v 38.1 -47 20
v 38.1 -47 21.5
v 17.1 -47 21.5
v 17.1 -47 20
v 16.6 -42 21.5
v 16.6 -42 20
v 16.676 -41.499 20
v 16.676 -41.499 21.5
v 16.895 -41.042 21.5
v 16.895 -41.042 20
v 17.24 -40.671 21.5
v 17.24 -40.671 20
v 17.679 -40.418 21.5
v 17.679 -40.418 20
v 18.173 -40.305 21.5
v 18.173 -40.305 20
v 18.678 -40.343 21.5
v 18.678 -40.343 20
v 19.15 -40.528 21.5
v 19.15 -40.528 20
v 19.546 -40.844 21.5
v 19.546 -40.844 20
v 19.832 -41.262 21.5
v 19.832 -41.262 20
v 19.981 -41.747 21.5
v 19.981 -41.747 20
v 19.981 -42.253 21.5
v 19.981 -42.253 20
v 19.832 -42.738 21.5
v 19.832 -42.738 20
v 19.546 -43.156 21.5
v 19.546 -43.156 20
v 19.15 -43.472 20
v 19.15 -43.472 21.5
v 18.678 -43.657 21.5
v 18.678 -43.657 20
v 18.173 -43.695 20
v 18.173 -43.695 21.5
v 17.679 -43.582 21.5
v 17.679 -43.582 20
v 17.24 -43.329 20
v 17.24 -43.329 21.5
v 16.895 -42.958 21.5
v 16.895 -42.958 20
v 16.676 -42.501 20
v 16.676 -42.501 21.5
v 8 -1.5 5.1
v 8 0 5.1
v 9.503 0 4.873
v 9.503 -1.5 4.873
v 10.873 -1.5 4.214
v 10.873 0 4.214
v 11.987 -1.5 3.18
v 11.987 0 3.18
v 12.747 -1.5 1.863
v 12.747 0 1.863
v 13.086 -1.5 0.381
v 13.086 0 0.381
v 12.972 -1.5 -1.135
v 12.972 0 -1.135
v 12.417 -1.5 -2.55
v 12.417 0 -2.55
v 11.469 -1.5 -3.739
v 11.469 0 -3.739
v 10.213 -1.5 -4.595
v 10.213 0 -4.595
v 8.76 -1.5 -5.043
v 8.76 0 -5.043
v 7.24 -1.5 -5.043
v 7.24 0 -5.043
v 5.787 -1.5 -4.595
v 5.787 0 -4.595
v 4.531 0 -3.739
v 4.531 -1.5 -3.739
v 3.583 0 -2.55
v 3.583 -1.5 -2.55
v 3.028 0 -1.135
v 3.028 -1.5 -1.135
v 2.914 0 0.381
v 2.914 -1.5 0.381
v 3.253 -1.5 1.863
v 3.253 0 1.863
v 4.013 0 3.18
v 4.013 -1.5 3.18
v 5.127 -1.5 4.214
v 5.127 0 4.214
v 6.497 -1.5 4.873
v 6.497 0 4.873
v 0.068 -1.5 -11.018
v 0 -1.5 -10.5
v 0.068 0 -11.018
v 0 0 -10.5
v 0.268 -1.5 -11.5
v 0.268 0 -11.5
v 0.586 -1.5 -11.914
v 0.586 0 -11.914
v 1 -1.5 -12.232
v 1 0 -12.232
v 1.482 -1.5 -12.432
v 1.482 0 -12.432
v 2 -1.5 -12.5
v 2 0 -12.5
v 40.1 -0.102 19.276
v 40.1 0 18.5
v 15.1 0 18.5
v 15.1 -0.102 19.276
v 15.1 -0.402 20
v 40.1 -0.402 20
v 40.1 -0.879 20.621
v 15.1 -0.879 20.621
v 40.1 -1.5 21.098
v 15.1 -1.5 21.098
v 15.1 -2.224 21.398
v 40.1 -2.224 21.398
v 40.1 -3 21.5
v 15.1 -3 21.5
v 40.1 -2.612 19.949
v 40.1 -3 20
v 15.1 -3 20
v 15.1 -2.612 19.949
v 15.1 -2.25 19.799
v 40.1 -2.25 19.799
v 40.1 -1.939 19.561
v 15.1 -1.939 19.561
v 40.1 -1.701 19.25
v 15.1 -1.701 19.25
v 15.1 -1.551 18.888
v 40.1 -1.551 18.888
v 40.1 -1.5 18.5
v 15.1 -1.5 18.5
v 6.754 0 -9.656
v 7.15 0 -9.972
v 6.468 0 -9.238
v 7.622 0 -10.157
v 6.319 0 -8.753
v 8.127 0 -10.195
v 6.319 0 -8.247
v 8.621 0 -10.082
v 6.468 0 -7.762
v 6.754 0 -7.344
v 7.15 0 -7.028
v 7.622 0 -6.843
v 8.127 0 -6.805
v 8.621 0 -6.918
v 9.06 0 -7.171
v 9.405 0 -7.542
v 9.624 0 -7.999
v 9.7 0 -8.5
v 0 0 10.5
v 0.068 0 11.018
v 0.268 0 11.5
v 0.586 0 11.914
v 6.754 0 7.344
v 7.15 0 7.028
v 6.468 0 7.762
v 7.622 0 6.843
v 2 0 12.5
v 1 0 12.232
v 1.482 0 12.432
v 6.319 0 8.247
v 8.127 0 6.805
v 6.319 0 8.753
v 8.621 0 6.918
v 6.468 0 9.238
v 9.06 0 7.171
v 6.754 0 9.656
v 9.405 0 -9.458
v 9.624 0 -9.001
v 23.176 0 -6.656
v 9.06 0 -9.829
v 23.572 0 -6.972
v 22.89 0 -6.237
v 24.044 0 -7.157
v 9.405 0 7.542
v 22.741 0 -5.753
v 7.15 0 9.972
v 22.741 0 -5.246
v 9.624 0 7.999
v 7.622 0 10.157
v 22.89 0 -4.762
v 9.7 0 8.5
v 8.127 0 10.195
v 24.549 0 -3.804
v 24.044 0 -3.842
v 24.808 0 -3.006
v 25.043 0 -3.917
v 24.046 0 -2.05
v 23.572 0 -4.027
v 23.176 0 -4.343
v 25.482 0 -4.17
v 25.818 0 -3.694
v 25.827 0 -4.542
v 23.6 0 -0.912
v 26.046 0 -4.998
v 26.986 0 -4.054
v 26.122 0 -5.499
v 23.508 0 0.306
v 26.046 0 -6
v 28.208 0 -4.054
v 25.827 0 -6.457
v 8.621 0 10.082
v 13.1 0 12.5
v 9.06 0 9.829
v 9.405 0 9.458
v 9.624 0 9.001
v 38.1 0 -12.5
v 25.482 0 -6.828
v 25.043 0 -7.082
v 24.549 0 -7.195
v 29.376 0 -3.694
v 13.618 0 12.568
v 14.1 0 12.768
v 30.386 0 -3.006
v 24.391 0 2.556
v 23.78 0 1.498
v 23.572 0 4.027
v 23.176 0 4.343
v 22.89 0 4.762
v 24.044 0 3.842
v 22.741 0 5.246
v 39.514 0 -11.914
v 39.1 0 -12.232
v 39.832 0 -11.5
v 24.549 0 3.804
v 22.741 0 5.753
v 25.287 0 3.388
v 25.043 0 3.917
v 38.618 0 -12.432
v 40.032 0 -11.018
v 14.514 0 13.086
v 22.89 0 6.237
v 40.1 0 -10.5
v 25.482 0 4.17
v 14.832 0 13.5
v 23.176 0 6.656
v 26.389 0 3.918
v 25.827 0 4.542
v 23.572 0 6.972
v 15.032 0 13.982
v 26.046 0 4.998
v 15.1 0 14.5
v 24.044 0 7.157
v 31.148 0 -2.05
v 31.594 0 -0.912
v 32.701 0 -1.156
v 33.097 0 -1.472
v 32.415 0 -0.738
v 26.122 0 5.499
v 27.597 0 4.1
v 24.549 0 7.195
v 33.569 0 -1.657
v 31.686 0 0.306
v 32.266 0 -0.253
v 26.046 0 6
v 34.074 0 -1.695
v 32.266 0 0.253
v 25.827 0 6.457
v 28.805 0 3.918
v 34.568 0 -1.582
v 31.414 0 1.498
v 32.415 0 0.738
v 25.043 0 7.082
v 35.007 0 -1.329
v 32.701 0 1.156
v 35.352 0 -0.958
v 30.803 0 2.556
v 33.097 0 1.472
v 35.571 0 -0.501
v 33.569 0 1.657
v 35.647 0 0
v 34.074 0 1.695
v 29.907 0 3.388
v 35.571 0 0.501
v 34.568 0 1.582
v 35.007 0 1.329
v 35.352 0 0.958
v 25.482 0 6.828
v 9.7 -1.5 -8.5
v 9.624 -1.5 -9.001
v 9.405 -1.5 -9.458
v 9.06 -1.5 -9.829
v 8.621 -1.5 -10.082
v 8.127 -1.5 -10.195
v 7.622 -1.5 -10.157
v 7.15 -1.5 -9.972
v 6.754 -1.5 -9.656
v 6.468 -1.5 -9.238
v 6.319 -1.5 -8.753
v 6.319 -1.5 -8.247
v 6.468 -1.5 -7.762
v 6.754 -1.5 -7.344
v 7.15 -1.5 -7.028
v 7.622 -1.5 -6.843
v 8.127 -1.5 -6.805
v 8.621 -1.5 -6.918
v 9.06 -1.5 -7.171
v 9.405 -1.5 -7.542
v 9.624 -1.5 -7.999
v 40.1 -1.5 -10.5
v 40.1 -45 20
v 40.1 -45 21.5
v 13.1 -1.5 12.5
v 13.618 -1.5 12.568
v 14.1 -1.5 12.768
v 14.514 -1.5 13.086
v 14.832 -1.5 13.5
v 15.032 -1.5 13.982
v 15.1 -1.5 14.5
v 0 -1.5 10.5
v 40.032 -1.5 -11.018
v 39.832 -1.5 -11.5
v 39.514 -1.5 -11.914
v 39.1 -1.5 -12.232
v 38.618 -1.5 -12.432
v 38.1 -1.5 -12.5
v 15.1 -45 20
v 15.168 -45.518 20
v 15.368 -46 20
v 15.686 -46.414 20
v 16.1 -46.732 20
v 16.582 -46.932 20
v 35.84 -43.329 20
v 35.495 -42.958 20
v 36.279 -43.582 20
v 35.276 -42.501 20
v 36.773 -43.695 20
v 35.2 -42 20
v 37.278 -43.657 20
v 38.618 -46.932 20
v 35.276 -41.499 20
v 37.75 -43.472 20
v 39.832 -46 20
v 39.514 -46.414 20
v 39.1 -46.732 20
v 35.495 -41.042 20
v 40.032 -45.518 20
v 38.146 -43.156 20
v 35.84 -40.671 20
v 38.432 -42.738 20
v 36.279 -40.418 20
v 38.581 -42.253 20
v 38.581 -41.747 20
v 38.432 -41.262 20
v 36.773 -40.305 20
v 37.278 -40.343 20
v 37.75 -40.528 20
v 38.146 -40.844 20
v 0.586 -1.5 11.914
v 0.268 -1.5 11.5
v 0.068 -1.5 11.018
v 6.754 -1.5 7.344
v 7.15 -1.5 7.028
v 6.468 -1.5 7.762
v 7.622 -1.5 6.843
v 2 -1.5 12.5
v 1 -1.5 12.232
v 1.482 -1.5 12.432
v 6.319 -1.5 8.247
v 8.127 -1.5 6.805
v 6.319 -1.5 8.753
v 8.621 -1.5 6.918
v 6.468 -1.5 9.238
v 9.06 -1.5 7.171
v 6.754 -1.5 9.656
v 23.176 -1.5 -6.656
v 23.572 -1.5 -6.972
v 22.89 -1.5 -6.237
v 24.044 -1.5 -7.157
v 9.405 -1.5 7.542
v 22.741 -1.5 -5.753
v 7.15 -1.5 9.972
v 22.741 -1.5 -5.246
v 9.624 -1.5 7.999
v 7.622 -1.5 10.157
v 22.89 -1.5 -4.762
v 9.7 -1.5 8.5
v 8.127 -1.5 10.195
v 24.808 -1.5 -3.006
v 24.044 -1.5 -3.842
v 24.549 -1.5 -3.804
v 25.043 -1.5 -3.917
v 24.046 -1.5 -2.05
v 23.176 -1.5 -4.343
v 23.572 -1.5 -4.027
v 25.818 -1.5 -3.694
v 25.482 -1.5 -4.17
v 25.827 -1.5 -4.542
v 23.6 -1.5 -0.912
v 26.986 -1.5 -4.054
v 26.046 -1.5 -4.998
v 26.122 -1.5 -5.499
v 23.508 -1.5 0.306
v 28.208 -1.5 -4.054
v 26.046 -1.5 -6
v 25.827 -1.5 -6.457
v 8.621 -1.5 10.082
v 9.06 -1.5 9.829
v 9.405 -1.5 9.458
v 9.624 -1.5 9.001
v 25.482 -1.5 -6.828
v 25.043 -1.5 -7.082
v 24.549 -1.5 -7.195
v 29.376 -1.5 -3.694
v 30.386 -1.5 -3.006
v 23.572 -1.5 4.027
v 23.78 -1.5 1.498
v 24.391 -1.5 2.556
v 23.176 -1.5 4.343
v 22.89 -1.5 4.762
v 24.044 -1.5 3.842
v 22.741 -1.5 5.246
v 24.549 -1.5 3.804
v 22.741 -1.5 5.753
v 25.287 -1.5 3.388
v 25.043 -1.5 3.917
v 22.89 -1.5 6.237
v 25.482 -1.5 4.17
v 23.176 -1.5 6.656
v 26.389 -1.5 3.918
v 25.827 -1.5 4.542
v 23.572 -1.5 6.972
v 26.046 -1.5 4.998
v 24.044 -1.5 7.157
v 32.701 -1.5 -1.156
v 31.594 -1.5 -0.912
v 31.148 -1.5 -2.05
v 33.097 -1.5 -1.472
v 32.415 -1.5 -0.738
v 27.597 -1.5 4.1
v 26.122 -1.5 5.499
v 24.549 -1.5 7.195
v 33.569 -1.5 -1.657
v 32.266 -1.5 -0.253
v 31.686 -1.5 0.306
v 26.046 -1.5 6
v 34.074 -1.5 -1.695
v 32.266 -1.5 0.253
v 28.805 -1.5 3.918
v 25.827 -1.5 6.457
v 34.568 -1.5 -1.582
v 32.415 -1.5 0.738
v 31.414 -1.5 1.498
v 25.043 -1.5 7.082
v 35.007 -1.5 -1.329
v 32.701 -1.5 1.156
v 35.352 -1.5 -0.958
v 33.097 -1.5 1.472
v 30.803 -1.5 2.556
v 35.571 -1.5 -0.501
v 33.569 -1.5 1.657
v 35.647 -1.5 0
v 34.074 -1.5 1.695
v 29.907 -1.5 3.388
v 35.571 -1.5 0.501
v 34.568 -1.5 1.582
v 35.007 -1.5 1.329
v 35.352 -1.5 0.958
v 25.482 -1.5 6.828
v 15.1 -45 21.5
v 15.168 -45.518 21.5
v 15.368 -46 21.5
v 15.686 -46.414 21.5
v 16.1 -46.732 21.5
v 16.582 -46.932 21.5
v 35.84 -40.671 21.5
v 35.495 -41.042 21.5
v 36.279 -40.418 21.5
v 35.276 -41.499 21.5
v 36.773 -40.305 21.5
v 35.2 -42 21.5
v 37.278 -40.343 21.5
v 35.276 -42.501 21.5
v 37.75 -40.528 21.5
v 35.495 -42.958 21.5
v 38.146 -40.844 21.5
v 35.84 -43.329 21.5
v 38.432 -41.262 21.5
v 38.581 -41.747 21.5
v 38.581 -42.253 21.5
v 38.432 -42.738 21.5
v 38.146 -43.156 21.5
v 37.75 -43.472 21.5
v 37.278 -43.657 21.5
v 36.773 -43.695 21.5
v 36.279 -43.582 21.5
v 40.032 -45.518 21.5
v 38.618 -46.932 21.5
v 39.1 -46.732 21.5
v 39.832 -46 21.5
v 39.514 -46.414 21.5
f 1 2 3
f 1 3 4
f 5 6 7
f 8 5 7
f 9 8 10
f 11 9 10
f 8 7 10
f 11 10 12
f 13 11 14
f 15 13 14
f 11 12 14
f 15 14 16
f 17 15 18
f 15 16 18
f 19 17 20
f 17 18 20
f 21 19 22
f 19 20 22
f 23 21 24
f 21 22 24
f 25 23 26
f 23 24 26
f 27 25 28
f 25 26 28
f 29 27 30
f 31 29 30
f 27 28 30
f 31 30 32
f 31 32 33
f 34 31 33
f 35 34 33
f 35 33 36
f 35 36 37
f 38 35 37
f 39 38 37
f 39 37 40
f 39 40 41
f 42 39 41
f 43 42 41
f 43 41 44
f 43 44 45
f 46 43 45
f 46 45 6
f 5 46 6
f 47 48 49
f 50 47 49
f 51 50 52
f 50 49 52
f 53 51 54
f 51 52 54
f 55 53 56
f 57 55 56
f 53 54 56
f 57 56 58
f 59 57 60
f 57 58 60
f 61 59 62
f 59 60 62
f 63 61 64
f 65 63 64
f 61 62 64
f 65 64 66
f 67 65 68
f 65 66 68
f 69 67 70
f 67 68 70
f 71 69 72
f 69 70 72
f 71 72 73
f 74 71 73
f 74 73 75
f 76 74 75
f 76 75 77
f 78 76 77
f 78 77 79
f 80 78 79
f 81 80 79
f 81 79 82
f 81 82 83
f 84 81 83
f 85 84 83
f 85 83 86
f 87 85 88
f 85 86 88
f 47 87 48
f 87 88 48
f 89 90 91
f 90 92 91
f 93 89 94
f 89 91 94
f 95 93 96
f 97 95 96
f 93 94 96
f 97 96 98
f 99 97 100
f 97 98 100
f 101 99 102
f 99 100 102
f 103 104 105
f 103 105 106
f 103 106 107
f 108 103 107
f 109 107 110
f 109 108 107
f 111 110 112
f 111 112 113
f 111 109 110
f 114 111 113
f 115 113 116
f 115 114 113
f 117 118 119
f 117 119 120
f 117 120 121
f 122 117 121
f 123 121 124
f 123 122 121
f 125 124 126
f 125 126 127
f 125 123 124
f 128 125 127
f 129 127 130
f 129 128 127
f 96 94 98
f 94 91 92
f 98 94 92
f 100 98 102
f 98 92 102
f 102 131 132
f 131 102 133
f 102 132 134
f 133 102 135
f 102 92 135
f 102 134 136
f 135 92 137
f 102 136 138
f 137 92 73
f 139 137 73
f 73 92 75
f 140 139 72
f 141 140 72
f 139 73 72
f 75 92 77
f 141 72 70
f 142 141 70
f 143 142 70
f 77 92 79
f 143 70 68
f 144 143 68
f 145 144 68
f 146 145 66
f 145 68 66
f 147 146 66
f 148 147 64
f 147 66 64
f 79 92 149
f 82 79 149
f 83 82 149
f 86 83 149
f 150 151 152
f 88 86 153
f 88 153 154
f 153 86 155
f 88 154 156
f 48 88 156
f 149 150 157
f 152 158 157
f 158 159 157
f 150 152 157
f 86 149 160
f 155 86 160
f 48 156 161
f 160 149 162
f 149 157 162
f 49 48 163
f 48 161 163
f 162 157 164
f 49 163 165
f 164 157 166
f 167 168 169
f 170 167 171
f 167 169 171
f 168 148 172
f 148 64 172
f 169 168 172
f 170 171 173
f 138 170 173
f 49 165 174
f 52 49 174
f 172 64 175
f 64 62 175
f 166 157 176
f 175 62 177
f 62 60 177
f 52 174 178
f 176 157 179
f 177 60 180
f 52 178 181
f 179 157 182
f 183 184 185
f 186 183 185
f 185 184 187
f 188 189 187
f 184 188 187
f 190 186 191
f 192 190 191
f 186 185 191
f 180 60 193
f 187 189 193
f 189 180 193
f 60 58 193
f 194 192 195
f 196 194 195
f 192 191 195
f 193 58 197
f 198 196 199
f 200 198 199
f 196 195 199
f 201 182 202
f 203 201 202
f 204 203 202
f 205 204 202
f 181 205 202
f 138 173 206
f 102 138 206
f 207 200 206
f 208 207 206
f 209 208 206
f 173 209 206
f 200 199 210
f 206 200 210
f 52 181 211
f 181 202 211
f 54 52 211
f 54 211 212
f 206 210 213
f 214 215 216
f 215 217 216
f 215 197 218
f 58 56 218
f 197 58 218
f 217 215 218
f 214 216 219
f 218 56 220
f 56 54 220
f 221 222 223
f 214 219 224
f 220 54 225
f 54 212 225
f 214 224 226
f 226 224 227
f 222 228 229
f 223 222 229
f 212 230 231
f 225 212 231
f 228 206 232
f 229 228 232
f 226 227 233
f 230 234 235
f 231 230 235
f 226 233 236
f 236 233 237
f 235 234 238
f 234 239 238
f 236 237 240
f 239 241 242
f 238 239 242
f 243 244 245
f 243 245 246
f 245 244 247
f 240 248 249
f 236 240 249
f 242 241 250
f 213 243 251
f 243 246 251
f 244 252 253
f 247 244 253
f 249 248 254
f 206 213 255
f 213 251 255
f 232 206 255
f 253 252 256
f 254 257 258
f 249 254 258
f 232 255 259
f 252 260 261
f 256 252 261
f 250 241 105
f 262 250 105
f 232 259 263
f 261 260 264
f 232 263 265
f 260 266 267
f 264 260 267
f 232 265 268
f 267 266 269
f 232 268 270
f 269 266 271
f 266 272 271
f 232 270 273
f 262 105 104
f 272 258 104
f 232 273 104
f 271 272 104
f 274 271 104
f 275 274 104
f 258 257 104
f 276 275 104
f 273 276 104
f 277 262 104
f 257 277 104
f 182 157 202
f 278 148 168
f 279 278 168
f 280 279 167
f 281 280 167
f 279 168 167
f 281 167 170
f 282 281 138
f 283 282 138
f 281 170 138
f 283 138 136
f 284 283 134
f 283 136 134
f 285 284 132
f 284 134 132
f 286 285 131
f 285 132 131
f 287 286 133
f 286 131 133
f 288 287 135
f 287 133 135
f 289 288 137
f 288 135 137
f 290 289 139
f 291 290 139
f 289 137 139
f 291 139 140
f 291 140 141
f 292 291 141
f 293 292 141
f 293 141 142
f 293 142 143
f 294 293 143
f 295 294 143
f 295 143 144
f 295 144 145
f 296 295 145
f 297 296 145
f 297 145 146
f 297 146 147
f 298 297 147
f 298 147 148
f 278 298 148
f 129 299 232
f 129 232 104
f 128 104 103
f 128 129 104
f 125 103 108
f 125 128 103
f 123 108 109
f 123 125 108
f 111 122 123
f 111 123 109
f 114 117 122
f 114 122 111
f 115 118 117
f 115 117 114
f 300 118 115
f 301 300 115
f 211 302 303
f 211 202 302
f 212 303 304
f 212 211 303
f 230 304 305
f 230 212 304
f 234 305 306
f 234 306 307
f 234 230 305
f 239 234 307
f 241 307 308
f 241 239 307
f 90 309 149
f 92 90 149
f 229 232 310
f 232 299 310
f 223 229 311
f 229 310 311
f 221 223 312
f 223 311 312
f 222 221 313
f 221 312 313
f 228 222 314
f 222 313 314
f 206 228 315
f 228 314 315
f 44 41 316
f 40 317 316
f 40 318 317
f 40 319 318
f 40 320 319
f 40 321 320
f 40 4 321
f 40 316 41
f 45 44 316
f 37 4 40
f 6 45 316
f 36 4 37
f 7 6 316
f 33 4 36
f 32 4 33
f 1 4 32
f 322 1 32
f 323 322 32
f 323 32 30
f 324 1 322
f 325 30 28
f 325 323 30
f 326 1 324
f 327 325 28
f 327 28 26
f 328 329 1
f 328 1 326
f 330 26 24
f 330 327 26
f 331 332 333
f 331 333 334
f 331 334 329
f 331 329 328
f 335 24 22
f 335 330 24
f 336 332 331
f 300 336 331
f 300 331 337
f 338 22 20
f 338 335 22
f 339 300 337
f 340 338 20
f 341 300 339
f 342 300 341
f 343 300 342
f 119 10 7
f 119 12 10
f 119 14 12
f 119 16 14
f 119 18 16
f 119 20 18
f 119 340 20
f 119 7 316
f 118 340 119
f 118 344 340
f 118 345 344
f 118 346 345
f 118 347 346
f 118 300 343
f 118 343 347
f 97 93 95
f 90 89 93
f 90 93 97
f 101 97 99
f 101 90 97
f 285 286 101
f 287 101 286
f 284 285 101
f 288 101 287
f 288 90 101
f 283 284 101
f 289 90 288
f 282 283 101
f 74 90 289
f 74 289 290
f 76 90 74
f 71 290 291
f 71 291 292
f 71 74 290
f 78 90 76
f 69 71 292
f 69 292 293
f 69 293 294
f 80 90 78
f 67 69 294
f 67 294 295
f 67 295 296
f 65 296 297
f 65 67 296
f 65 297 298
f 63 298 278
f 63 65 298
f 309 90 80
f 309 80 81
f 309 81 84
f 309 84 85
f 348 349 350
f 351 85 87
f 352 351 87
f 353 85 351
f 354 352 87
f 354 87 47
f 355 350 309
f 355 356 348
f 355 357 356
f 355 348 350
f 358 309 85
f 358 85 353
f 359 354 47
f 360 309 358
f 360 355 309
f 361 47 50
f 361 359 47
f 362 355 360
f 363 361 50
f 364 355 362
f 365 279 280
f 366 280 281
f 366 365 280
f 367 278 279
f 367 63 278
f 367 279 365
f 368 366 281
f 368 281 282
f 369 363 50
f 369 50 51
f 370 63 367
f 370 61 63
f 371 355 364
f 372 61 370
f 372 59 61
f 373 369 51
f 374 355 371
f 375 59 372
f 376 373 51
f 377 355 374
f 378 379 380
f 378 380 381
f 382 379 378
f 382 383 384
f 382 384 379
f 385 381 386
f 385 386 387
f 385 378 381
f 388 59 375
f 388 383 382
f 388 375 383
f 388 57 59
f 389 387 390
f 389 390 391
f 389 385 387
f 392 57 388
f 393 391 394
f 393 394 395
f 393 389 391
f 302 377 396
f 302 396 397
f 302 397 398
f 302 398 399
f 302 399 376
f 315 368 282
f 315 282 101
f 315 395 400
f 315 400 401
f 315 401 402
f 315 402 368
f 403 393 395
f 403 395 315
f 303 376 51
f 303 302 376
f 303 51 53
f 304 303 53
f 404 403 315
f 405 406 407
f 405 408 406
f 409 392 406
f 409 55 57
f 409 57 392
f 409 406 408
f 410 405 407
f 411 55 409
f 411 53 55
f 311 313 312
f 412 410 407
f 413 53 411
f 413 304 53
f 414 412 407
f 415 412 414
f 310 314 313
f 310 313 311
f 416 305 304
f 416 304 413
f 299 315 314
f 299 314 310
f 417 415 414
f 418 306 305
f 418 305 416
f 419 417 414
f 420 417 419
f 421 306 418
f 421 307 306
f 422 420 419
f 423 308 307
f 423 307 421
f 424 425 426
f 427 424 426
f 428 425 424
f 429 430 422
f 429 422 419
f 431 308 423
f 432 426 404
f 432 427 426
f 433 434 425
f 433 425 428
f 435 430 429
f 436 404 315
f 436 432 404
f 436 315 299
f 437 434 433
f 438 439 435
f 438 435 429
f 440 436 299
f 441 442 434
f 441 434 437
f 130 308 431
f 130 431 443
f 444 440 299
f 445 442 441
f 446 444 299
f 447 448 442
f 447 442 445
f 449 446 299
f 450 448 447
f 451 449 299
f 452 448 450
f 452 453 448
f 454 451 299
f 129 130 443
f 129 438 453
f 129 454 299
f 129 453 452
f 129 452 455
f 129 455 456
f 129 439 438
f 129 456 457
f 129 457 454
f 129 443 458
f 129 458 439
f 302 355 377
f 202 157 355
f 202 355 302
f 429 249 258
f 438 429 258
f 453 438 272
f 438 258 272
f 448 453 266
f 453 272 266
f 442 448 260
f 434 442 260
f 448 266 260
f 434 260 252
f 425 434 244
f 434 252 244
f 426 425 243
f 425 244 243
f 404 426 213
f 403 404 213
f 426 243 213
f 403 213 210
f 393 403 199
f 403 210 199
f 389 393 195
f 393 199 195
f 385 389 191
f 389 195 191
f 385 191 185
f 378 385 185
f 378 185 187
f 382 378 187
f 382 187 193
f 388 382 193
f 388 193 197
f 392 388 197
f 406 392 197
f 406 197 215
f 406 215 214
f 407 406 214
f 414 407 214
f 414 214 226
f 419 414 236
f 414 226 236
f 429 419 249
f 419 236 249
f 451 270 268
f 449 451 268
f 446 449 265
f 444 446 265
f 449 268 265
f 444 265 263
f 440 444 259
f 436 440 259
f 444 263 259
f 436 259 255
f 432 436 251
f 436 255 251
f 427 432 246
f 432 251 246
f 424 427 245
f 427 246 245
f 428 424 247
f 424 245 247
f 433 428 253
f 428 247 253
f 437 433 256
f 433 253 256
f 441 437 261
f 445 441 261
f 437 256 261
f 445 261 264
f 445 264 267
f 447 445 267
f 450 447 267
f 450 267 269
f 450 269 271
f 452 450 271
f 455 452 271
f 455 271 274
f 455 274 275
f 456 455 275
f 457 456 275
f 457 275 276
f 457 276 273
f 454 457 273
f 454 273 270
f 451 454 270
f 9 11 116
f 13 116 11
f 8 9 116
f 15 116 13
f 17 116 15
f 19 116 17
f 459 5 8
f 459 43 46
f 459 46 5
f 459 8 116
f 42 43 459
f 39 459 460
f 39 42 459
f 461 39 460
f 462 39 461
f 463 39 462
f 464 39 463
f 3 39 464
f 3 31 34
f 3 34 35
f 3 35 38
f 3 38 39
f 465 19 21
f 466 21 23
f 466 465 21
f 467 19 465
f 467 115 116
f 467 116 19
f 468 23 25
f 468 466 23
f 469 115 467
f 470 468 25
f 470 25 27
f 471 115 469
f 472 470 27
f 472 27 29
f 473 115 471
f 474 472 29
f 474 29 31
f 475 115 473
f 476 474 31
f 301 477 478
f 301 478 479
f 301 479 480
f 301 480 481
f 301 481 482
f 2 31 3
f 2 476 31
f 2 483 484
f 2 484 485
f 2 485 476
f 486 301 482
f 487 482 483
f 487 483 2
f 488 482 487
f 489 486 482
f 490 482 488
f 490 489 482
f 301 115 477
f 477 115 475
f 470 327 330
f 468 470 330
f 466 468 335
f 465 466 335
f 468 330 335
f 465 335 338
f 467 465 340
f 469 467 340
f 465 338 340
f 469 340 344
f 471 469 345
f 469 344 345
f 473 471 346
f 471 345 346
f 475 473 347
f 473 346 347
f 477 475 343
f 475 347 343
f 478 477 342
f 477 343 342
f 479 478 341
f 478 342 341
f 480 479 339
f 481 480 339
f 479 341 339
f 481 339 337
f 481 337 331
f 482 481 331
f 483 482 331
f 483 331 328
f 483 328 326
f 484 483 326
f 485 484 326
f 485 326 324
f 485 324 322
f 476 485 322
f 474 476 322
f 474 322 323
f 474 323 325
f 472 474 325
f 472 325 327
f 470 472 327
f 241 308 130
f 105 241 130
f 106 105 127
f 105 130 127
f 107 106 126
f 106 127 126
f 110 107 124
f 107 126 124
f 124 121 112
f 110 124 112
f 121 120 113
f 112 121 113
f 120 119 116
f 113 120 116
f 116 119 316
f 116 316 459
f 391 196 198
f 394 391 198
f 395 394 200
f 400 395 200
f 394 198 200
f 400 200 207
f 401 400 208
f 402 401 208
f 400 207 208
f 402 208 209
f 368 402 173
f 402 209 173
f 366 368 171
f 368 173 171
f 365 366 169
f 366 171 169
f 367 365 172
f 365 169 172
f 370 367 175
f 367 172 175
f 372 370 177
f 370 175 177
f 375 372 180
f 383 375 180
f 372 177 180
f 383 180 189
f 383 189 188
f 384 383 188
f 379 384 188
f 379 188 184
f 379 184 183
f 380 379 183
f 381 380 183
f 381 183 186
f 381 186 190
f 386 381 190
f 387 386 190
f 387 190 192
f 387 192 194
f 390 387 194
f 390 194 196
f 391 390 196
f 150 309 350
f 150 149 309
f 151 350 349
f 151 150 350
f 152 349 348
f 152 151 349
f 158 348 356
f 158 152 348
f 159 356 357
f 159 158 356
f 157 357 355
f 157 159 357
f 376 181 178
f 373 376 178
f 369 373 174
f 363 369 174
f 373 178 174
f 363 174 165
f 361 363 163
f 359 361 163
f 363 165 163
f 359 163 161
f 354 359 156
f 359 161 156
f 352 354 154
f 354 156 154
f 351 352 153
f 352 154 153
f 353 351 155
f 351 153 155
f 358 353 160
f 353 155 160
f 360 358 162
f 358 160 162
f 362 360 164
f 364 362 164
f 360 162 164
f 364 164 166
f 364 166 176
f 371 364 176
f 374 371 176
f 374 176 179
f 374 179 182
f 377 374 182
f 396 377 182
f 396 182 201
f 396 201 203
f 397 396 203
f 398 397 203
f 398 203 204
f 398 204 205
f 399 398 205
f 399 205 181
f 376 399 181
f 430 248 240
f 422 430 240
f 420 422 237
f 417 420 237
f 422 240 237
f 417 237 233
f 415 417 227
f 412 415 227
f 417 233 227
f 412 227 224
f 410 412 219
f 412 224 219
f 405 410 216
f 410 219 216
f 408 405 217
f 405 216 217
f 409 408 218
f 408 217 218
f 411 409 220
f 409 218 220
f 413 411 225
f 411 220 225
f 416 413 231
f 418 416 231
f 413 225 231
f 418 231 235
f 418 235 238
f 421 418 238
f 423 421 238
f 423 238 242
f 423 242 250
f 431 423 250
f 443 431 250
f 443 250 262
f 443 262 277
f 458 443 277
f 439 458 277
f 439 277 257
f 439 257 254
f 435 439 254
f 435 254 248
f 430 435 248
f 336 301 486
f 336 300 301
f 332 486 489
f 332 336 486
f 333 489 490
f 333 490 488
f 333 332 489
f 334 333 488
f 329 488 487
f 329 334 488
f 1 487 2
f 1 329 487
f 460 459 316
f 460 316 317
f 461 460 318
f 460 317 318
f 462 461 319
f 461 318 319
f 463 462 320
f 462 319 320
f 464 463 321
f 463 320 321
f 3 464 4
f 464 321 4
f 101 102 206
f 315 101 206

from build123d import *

# Parameters (mm, degrees)
SKETCH1_W            = 41.6
SKETCH1_H            = 1.5
BASE_FLANGE1_DEPTH   = 12.5
M3_CLEARANCE_HOLE2_D = 3.4
M3_CLEARANCE_HOLE3_D = 3.4
SKETCH12_R           = 5.1
SKETCH12_R_2         = 4.1
CUT_EXTRUDE1_DEPTH   = 1.5
EDGE_FLANGE1_DEPTH   = 25
SKETCH22_W           = 1.5
SKETCH22_H           = 25
CUT_EXTRUDE2_DEPTH   = 1.5
FILLET1_R            = 2
M3_CLEARANCE_HOLE4_D = 3.4


# Sheet-metal steps are written as plain solids
with BuildPart() as part:
    # Sketch1 → Base-Flange1 (new, symmetric)
    with BuildSketch(Plane.XY):
        with Locations((20.8, -0.75)):
            Rectangle(SKETCH1_W, SKETCH1_H)
    extrude(amount=BASE_FLANGE1_DEPTH, both=True)

    # M3 Clearance Hole2 (through all)
    with Locations(Plane(origin=(0, -1.5, 0), x_dir=(-1, 0, 0), z_dir=(0, -1, 0))):
        with Locations((-8, -8.5), (-8, 8.5)):
            Hole(M3_CLEARANCE_HOLE2_D / 2)

    # M3 Clearance Hole3 (through all)
    with Locations(Plane(origin=(0, -1.5, 0), x_dir=(-1, 0, 0), z_dir=(0, -1, 0))):
        with Locations((-24.422, -5.499261314), (-33.947, 0), (-24.422, 5.499261314)):
            Hole(M3_CLEARANCE_HOLE3_D / 2)

    # Sketch12 → Cut-Extrude1 (cut)
    with BuildSketch(Plane(origin=(0, 0, 0), x_dir=(1, 0, 0), z_dir=(0, 1, 0))):
        with Locations(Location((8, 0, 0), (0, 0, 270))):
            Circle(SKETCH12_R)
        with Locations(Location((27.597, 0, 0), (0, 0, 270))):
            Circle(SKETCH12_R_2)
    extrude(amount=-CUT_EXTRUDE1_DEPTH, mode=Mode.SUBTRACT)

    # Edge-Flange1 section (across the edge) → Edge-Flange1 (add)
    with BuildSketch(Plane(origin=(40.1, -1.5, 20), x_dir=(0, 0, -1), z_dir=(-1, 0, 0))):
        with BuildLine():
            Line((-1.5, 1.5), (-1.5, 45.5))
            Line((-1.5, 45.5), (0, 45.5))
            Line((0, 45.5), (0, 1.5))
            ThreePointArc((0, 1.5), (0.439339828, 0.439339828), (1.5, 0))
            Line((1.5, 0), (7.5, 0))
            Line((7.5, 0), (7.5, -1.5))
            Line((7.5, -1.5), (1.5, -1.5))
            ThreePointArc((1.5, -1.5), (-0.621320344, -0.621320344), (-1.5, 1.5))
        make_face()
    extrude(amount=EDGE_FLANGE1_DEPTH)

    # Sketch22 → Cut-Extrude2 (cut)
    with BuildSketch(Plane(origin=(0, 0, 0), x_dir=(1, 0, 0), z_dir=(0, 1, 0))):
        with Locations((40.85, 0)):
            Rectangle(SKETCH22_W, SKETCH22_H)
    extrude(amount=-CUT_EXTRUDE2_DEPTH, mode=Mode.SUBTRACT)

    # Fillet1
    fillet1_edges = [part.edges().sort_by_distance(p)[0] for p in [
        (0, -0.75, 12.5),
        (0, -0.75, -12.5),
        (15.1, -0.75, 12.5),
        (40.1, -47, 20.75),
        (15.1, -47, 20.75),
        (40.1, -0.75, -12.5),
    ]]
    fillet(fillet1_edges, radius=FILLET1_R)

    # M3 Clearance Hole4 (through all)
    with Locations(Plane.XY.offset(21.5)):
        with Locations((36.9, -42), (18.3, -42)):
            Hole(M3_CLEARANCE_HOLE4_D / 2)


solid = part.part
